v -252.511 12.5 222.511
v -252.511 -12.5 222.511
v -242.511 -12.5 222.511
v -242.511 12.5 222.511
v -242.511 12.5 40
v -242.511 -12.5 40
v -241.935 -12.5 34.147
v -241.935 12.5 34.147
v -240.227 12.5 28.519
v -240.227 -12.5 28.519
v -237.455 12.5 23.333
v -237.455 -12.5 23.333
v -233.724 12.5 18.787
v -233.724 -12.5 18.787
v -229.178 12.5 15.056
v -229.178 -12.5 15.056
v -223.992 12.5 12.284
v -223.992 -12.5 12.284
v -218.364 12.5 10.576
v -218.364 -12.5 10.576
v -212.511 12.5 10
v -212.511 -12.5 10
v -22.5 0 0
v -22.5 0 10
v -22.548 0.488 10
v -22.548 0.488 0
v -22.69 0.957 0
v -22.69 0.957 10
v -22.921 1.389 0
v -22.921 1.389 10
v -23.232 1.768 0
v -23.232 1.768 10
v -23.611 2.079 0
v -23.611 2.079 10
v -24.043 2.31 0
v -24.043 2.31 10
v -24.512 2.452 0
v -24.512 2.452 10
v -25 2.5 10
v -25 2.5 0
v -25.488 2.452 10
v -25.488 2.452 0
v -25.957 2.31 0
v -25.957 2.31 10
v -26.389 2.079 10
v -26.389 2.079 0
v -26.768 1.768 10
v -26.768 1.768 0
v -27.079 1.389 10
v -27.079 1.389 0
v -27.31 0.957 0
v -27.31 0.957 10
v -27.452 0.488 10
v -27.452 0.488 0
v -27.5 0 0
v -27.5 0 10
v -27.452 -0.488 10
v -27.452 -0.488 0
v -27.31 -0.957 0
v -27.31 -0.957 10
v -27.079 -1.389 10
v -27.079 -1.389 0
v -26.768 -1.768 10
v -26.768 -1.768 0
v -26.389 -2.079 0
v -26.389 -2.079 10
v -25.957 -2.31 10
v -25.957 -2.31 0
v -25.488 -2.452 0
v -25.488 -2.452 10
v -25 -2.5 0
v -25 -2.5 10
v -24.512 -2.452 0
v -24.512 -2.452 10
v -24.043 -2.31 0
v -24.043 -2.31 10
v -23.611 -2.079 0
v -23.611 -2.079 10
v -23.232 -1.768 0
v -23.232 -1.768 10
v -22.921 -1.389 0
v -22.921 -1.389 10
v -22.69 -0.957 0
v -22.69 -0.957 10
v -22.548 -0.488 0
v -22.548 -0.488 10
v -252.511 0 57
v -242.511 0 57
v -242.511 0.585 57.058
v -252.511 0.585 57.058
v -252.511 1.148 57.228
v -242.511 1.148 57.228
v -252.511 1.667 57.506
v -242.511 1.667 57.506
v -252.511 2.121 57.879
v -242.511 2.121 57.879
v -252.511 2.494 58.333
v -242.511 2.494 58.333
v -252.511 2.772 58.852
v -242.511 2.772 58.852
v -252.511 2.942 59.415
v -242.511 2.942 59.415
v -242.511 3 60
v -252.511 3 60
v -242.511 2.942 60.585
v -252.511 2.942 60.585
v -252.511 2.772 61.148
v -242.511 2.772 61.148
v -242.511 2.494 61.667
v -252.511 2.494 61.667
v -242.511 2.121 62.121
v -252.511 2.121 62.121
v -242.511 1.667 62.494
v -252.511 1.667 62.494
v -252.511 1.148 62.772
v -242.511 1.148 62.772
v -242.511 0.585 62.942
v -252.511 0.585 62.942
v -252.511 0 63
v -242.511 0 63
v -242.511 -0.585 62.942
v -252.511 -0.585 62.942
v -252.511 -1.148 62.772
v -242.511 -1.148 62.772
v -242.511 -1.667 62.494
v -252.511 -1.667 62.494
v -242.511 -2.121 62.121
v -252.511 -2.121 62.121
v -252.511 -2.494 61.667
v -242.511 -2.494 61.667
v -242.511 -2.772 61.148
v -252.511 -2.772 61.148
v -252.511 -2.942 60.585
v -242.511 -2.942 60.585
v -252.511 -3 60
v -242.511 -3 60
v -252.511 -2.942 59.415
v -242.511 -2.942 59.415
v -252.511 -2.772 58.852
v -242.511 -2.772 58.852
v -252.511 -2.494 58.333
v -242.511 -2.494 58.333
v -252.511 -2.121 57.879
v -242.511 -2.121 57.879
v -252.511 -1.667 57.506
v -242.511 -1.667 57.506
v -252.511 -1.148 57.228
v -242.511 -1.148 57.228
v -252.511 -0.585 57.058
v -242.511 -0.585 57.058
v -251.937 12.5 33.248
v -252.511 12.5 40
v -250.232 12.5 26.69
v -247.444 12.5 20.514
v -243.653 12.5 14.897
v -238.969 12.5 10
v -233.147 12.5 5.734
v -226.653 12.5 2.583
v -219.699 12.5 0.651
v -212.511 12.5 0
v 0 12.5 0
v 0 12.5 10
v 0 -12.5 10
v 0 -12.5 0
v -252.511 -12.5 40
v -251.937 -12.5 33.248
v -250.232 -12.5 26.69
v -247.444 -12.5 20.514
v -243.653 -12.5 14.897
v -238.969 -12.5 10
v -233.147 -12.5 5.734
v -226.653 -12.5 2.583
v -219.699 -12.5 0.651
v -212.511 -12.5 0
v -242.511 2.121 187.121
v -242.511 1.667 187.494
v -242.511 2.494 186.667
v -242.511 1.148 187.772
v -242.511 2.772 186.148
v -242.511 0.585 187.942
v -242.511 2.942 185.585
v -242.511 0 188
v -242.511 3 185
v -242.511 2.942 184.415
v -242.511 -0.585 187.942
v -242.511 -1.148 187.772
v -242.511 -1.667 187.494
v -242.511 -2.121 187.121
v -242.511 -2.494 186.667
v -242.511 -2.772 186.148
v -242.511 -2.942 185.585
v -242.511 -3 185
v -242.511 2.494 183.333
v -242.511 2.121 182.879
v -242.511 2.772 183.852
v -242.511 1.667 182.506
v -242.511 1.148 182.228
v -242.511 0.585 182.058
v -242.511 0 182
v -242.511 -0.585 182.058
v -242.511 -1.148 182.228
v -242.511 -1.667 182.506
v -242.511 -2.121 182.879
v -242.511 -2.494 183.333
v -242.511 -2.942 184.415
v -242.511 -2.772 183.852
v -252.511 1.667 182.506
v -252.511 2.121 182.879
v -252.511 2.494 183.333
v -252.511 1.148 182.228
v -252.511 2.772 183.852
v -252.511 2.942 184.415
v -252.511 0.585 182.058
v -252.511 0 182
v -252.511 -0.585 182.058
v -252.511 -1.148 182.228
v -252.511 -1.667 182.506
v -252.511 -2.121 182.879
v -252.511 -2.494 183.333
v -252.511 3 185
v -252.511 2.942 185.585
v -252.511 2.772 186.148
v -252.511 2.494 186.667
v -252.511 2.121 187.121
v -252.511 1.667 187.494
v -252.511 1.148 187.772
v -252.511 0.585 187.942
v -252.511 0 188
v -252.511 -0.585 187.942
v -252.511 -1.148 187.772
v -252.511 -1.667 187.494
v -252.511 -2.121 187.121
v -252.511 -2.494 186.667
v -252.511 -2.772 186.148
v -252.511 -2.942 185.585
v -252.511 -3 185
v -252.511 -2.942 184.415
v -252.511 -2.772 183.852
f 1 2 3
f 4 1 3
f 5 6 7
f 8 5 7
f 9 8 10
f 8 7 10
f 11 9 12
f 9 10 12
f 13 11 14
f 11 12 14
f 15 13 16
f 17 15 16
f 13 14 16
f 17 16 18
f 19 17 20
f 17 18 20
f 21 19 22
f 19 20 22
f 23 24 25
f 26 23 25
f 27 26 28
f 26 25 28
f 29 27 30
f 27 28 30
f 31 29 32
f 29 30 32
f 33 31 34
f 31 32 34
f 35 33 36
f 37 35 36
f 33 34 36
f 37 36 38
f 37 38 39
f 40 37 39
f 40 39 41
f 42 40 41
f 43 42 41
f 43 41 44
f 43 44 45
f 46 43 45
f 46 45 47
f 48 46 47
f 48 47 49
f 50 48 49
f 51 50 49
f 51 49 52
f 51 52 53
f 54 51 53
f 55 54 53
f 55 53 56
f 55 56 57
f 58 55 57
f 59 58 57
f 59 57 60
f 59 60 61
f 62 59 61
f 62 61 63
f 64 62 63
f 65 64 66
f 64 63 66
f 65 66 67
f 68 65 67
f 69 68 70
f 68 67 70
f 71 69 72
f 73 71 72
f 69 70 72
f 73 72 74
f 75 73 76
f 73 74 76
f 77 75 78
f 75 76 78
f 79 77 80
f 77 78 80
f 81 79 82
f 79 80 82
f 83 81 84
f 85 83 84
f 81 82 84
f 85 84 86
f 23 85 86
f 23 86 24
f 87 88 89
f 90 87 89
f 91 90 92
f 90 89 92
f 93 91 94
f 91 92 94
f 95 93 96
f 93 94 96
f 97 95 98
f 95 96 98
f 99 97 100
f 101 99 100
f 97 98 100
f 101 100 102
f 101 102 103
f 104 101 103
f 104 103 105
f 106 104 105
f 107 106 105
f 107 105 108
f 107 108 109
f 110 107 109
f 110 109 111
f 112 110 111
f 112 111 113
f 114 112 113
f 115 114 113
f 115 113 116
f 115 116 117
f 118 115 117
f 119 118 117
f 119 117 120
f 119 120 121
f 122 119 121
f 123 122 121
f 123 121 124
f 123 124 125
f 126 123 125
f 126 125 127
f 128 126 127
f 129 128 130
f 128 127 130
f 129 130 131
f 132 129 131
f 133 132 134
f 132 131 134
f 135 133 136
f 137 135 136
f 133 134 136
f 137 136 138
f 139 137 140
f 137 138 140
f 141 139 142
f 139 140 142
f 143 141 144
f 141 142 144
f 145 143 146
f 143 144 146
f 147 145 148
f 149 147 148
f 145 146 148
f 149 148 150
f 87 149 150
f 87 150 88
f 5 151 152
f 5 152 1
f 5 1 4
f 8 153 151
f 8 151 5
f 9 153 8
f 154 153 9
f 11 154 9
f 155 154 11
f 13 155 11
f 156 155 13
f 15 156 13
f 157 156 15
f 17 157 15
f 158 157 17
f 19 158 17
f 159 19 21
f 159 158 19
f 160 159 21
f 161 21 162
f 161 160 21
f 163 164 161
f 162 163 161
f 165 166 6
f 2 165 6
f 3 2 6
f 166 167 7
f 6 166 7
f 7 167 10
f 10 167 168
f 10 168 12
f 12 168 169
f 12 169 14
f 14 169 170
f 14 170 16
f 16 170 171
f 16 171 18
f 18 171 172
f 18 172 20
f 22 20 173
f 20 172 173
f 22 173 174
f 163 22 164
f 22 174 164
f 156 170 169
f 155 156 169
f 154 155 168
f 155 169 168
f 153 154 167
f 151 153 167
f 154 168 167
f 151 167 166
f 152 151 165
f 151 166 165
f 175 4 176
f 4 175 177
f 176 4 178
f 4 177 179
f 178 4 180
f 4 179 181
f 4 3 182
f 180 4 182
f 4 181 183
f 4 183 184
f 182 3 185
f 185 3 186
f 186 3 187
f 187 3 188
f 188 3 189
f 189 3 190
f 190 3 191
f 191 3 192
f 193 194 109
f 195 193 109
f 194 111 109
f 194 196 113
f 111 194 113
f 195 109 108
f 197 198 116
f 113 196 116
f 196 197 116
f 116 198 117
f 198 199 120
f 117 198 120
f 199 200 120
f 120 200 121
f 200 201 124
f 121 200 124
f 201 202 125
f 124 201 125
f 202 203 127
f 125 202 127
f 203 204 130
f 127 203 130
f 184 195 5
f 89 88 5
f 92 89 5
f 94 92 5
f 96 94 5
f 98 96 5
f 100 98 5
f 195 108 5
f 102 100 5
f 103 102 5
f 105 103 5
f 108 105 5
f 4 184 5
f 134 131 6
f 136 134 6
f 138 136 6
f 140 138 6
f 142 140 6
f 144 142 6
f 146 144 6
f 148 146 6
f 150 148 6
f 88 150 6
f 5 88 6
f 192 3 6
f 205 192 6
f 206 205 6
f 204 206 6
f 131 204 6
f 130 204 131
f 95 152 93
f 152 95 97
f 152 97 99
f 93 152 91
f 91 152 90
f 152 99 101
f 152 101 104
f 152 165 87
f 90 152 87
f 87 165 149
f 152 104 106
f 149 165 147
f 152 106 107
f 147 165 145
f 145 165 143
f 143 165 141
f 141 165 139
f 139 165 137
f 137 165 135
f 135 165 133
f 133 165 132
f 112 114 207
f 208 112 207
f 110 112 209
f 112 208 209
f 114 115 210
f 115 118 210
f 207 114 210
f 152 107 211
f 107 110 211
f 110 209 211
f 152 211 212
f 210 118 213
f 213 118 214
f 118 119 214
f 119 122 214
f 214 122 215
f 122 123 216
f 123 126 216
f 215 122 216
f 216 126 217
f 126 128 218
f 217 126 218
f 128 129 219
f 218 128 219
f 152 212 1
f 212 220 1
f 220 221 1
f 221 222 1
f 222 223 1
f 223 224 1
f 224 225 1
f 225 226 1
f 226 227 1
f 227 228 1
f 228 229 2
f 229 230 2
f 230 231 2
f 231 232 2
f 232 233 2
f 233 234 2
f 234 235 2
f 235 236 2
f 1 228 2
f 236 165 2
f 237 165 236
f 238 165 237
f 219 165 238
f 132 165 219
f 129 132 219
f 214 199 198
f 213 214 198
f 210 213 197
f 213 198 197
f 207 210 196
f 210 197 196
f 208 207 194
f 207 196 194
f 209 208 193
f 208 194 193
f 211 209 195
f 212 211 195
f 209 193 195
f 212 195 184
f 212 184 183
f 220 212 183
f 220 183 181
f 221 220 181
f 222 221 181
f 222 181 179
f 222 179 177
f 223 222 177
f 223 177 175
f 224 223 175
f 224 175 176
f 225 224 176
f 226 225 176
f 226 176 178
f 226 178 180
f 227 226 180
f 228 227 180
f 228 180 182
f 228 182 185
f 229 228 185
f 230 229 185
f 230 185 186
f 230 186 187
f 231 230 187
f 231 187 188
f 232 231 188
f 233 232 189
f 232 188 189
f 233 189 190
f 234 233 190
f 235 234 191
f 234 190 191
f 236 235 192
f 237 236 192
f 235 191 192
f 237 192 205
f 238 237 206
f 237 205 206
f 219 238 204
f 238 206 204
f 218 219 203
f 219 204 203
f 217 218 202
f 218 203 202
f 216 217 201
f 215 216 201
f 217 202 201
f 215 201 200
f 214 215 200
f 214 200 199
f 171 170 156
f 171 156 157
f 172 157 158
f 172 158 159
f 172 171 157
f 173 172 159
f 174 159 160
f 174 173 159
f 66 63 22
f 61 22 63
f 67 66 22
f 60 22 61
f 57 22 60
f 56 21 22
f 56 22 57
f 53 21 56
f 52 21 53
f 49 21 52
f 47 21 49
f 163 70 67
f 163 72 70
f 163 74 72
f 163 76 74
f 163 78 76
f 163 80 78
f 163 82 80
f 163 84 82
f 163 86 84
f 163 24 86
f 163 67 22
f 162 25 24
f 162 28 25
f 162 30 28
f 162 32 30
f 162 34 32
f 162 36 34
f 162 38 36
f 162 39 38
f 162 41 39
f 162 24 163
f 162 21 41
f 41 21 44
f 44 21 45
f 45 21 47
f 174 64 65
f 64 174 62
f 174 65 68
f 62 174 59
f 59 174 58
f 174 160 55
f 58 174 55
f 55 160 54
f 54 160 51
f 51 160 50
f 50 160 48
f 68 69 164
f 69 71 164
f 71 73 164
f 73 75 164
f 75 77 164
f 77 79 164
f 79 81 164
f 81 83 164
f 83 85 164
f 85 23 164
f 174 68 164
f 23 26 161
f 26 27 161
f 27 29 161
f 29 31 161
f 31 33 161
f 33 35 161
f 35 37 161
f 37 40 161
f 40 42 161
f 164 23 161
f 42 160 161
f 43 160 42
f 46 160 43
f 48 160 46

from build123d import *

# Parameters (mm, degrees)
ESQUISSE1_W             = 450
ESQUISSE1_H             = 25
EXTRUSION1_DEPTH        = 10
PLIAGE_START            = -12.5
PLIAGE_1_DEPTH          = 25
PLIAGE_1_2_DEPTH        = 25
ESQUISSE5_R             = 3
ENL_V_MAT_EXTRU_1_DEPTH = 330.361564282
ESQUISSE7_R             = 2.5
ENL_V_MAT_EXTRU_2_DEPTH = 331.27116136


# Read off the part's stored shape, not the designer's step: Pliage 1
with BuildPart() as part:
    # Esquisse1 → Extrusion1 (new body)
    with BuildSketch(Plane.XY):
        with Locations((-225, 0)):
            Rectangle(ESQUISSE1_W, ESQUISSE1_H)
    extrude(amount=EXTRUSION1_DEPTH)

    # Pliage 1 outline → Pliage 1 (cut)
    with BuildSketch(Plane(origin=(0, 0, 0), x_dir=(1, 0, 0), z_dir=(0, 1, 0)).offset(PLIAGE_START)):
        with BuildLine():
            Line((-450, -10), (-238.968577392, -10))
            ThreePointArc((-238.968577392, -10), (-226.653199905, -2.583426132), (-212.511064281, 0))
            Line((-212.511064281, 0), (-450, 0))
            Line((-450, 0), (-450, -10))
        make_face()
    extrude(amount=PLIAGE_1_DEPTH, mode=Mode.SUBTRACT)

    # Pliage 1 2 outline → Pliage 1 2 (add)
    with BuildSketch(Plane(origin=(0, 0, 0), x_dir=(1, 0, 0), z_dir=(0, 1, 0)).offset(PLIAGE_START)):
        with BuildLine():
            ThreePointArc((-238.968577392, -10), (-248.968577392, -23.542486889), (-252.511064281, -40))
            Line((-252.511064281, -40), (-252.511064281, -222.511064281))
            Line((-252.511064281, -222.511064281), (-242.511064281, -222.511064281))
            Line((-242.511064281, -222.511064281), (-242.511064281, -40))
            ThreePointArc((-242.511064281, -40), (-233.724267717, -18.786796564), (-212.511064281, -10))
            Line((-212.511064281, -10), (-238.968577392, -10))
        make_face()
    extrude(amount=PLIAGE_1_2_DEPTH)

    # Esquisse5 → Enlèv. mat.-Extru.1 (cut, through all)
    with BuildSketch(Plane(origin=(-242.511064281, 0, 0), x_dir=(0, 0, -1), z_dir=(1, 0, 0))):
        with Locations((-185, 0)):
            Circle(ESQUISSE5_R)
        with Locations((-60, 0)):
            Circle(ESQUISSE5_R)
    extrude(amount=-ENL_V_MAT_EXTRU_1_DEPTH, mode=Mode.SUBTRACT)

    # Esquisse7 → Enlèv. mat.-Extru.2 (cut, through all)
    with BuildSketch(Plane.XY.offset(10)):
        with Locations((-25, 0)):
            Circle(ESQUISSE7_R)
    extrude(amount=-ENL_V_MAT_EXTRU_2_DEPTH, mode=Mode.SUBTRACT)


solid = part.part
